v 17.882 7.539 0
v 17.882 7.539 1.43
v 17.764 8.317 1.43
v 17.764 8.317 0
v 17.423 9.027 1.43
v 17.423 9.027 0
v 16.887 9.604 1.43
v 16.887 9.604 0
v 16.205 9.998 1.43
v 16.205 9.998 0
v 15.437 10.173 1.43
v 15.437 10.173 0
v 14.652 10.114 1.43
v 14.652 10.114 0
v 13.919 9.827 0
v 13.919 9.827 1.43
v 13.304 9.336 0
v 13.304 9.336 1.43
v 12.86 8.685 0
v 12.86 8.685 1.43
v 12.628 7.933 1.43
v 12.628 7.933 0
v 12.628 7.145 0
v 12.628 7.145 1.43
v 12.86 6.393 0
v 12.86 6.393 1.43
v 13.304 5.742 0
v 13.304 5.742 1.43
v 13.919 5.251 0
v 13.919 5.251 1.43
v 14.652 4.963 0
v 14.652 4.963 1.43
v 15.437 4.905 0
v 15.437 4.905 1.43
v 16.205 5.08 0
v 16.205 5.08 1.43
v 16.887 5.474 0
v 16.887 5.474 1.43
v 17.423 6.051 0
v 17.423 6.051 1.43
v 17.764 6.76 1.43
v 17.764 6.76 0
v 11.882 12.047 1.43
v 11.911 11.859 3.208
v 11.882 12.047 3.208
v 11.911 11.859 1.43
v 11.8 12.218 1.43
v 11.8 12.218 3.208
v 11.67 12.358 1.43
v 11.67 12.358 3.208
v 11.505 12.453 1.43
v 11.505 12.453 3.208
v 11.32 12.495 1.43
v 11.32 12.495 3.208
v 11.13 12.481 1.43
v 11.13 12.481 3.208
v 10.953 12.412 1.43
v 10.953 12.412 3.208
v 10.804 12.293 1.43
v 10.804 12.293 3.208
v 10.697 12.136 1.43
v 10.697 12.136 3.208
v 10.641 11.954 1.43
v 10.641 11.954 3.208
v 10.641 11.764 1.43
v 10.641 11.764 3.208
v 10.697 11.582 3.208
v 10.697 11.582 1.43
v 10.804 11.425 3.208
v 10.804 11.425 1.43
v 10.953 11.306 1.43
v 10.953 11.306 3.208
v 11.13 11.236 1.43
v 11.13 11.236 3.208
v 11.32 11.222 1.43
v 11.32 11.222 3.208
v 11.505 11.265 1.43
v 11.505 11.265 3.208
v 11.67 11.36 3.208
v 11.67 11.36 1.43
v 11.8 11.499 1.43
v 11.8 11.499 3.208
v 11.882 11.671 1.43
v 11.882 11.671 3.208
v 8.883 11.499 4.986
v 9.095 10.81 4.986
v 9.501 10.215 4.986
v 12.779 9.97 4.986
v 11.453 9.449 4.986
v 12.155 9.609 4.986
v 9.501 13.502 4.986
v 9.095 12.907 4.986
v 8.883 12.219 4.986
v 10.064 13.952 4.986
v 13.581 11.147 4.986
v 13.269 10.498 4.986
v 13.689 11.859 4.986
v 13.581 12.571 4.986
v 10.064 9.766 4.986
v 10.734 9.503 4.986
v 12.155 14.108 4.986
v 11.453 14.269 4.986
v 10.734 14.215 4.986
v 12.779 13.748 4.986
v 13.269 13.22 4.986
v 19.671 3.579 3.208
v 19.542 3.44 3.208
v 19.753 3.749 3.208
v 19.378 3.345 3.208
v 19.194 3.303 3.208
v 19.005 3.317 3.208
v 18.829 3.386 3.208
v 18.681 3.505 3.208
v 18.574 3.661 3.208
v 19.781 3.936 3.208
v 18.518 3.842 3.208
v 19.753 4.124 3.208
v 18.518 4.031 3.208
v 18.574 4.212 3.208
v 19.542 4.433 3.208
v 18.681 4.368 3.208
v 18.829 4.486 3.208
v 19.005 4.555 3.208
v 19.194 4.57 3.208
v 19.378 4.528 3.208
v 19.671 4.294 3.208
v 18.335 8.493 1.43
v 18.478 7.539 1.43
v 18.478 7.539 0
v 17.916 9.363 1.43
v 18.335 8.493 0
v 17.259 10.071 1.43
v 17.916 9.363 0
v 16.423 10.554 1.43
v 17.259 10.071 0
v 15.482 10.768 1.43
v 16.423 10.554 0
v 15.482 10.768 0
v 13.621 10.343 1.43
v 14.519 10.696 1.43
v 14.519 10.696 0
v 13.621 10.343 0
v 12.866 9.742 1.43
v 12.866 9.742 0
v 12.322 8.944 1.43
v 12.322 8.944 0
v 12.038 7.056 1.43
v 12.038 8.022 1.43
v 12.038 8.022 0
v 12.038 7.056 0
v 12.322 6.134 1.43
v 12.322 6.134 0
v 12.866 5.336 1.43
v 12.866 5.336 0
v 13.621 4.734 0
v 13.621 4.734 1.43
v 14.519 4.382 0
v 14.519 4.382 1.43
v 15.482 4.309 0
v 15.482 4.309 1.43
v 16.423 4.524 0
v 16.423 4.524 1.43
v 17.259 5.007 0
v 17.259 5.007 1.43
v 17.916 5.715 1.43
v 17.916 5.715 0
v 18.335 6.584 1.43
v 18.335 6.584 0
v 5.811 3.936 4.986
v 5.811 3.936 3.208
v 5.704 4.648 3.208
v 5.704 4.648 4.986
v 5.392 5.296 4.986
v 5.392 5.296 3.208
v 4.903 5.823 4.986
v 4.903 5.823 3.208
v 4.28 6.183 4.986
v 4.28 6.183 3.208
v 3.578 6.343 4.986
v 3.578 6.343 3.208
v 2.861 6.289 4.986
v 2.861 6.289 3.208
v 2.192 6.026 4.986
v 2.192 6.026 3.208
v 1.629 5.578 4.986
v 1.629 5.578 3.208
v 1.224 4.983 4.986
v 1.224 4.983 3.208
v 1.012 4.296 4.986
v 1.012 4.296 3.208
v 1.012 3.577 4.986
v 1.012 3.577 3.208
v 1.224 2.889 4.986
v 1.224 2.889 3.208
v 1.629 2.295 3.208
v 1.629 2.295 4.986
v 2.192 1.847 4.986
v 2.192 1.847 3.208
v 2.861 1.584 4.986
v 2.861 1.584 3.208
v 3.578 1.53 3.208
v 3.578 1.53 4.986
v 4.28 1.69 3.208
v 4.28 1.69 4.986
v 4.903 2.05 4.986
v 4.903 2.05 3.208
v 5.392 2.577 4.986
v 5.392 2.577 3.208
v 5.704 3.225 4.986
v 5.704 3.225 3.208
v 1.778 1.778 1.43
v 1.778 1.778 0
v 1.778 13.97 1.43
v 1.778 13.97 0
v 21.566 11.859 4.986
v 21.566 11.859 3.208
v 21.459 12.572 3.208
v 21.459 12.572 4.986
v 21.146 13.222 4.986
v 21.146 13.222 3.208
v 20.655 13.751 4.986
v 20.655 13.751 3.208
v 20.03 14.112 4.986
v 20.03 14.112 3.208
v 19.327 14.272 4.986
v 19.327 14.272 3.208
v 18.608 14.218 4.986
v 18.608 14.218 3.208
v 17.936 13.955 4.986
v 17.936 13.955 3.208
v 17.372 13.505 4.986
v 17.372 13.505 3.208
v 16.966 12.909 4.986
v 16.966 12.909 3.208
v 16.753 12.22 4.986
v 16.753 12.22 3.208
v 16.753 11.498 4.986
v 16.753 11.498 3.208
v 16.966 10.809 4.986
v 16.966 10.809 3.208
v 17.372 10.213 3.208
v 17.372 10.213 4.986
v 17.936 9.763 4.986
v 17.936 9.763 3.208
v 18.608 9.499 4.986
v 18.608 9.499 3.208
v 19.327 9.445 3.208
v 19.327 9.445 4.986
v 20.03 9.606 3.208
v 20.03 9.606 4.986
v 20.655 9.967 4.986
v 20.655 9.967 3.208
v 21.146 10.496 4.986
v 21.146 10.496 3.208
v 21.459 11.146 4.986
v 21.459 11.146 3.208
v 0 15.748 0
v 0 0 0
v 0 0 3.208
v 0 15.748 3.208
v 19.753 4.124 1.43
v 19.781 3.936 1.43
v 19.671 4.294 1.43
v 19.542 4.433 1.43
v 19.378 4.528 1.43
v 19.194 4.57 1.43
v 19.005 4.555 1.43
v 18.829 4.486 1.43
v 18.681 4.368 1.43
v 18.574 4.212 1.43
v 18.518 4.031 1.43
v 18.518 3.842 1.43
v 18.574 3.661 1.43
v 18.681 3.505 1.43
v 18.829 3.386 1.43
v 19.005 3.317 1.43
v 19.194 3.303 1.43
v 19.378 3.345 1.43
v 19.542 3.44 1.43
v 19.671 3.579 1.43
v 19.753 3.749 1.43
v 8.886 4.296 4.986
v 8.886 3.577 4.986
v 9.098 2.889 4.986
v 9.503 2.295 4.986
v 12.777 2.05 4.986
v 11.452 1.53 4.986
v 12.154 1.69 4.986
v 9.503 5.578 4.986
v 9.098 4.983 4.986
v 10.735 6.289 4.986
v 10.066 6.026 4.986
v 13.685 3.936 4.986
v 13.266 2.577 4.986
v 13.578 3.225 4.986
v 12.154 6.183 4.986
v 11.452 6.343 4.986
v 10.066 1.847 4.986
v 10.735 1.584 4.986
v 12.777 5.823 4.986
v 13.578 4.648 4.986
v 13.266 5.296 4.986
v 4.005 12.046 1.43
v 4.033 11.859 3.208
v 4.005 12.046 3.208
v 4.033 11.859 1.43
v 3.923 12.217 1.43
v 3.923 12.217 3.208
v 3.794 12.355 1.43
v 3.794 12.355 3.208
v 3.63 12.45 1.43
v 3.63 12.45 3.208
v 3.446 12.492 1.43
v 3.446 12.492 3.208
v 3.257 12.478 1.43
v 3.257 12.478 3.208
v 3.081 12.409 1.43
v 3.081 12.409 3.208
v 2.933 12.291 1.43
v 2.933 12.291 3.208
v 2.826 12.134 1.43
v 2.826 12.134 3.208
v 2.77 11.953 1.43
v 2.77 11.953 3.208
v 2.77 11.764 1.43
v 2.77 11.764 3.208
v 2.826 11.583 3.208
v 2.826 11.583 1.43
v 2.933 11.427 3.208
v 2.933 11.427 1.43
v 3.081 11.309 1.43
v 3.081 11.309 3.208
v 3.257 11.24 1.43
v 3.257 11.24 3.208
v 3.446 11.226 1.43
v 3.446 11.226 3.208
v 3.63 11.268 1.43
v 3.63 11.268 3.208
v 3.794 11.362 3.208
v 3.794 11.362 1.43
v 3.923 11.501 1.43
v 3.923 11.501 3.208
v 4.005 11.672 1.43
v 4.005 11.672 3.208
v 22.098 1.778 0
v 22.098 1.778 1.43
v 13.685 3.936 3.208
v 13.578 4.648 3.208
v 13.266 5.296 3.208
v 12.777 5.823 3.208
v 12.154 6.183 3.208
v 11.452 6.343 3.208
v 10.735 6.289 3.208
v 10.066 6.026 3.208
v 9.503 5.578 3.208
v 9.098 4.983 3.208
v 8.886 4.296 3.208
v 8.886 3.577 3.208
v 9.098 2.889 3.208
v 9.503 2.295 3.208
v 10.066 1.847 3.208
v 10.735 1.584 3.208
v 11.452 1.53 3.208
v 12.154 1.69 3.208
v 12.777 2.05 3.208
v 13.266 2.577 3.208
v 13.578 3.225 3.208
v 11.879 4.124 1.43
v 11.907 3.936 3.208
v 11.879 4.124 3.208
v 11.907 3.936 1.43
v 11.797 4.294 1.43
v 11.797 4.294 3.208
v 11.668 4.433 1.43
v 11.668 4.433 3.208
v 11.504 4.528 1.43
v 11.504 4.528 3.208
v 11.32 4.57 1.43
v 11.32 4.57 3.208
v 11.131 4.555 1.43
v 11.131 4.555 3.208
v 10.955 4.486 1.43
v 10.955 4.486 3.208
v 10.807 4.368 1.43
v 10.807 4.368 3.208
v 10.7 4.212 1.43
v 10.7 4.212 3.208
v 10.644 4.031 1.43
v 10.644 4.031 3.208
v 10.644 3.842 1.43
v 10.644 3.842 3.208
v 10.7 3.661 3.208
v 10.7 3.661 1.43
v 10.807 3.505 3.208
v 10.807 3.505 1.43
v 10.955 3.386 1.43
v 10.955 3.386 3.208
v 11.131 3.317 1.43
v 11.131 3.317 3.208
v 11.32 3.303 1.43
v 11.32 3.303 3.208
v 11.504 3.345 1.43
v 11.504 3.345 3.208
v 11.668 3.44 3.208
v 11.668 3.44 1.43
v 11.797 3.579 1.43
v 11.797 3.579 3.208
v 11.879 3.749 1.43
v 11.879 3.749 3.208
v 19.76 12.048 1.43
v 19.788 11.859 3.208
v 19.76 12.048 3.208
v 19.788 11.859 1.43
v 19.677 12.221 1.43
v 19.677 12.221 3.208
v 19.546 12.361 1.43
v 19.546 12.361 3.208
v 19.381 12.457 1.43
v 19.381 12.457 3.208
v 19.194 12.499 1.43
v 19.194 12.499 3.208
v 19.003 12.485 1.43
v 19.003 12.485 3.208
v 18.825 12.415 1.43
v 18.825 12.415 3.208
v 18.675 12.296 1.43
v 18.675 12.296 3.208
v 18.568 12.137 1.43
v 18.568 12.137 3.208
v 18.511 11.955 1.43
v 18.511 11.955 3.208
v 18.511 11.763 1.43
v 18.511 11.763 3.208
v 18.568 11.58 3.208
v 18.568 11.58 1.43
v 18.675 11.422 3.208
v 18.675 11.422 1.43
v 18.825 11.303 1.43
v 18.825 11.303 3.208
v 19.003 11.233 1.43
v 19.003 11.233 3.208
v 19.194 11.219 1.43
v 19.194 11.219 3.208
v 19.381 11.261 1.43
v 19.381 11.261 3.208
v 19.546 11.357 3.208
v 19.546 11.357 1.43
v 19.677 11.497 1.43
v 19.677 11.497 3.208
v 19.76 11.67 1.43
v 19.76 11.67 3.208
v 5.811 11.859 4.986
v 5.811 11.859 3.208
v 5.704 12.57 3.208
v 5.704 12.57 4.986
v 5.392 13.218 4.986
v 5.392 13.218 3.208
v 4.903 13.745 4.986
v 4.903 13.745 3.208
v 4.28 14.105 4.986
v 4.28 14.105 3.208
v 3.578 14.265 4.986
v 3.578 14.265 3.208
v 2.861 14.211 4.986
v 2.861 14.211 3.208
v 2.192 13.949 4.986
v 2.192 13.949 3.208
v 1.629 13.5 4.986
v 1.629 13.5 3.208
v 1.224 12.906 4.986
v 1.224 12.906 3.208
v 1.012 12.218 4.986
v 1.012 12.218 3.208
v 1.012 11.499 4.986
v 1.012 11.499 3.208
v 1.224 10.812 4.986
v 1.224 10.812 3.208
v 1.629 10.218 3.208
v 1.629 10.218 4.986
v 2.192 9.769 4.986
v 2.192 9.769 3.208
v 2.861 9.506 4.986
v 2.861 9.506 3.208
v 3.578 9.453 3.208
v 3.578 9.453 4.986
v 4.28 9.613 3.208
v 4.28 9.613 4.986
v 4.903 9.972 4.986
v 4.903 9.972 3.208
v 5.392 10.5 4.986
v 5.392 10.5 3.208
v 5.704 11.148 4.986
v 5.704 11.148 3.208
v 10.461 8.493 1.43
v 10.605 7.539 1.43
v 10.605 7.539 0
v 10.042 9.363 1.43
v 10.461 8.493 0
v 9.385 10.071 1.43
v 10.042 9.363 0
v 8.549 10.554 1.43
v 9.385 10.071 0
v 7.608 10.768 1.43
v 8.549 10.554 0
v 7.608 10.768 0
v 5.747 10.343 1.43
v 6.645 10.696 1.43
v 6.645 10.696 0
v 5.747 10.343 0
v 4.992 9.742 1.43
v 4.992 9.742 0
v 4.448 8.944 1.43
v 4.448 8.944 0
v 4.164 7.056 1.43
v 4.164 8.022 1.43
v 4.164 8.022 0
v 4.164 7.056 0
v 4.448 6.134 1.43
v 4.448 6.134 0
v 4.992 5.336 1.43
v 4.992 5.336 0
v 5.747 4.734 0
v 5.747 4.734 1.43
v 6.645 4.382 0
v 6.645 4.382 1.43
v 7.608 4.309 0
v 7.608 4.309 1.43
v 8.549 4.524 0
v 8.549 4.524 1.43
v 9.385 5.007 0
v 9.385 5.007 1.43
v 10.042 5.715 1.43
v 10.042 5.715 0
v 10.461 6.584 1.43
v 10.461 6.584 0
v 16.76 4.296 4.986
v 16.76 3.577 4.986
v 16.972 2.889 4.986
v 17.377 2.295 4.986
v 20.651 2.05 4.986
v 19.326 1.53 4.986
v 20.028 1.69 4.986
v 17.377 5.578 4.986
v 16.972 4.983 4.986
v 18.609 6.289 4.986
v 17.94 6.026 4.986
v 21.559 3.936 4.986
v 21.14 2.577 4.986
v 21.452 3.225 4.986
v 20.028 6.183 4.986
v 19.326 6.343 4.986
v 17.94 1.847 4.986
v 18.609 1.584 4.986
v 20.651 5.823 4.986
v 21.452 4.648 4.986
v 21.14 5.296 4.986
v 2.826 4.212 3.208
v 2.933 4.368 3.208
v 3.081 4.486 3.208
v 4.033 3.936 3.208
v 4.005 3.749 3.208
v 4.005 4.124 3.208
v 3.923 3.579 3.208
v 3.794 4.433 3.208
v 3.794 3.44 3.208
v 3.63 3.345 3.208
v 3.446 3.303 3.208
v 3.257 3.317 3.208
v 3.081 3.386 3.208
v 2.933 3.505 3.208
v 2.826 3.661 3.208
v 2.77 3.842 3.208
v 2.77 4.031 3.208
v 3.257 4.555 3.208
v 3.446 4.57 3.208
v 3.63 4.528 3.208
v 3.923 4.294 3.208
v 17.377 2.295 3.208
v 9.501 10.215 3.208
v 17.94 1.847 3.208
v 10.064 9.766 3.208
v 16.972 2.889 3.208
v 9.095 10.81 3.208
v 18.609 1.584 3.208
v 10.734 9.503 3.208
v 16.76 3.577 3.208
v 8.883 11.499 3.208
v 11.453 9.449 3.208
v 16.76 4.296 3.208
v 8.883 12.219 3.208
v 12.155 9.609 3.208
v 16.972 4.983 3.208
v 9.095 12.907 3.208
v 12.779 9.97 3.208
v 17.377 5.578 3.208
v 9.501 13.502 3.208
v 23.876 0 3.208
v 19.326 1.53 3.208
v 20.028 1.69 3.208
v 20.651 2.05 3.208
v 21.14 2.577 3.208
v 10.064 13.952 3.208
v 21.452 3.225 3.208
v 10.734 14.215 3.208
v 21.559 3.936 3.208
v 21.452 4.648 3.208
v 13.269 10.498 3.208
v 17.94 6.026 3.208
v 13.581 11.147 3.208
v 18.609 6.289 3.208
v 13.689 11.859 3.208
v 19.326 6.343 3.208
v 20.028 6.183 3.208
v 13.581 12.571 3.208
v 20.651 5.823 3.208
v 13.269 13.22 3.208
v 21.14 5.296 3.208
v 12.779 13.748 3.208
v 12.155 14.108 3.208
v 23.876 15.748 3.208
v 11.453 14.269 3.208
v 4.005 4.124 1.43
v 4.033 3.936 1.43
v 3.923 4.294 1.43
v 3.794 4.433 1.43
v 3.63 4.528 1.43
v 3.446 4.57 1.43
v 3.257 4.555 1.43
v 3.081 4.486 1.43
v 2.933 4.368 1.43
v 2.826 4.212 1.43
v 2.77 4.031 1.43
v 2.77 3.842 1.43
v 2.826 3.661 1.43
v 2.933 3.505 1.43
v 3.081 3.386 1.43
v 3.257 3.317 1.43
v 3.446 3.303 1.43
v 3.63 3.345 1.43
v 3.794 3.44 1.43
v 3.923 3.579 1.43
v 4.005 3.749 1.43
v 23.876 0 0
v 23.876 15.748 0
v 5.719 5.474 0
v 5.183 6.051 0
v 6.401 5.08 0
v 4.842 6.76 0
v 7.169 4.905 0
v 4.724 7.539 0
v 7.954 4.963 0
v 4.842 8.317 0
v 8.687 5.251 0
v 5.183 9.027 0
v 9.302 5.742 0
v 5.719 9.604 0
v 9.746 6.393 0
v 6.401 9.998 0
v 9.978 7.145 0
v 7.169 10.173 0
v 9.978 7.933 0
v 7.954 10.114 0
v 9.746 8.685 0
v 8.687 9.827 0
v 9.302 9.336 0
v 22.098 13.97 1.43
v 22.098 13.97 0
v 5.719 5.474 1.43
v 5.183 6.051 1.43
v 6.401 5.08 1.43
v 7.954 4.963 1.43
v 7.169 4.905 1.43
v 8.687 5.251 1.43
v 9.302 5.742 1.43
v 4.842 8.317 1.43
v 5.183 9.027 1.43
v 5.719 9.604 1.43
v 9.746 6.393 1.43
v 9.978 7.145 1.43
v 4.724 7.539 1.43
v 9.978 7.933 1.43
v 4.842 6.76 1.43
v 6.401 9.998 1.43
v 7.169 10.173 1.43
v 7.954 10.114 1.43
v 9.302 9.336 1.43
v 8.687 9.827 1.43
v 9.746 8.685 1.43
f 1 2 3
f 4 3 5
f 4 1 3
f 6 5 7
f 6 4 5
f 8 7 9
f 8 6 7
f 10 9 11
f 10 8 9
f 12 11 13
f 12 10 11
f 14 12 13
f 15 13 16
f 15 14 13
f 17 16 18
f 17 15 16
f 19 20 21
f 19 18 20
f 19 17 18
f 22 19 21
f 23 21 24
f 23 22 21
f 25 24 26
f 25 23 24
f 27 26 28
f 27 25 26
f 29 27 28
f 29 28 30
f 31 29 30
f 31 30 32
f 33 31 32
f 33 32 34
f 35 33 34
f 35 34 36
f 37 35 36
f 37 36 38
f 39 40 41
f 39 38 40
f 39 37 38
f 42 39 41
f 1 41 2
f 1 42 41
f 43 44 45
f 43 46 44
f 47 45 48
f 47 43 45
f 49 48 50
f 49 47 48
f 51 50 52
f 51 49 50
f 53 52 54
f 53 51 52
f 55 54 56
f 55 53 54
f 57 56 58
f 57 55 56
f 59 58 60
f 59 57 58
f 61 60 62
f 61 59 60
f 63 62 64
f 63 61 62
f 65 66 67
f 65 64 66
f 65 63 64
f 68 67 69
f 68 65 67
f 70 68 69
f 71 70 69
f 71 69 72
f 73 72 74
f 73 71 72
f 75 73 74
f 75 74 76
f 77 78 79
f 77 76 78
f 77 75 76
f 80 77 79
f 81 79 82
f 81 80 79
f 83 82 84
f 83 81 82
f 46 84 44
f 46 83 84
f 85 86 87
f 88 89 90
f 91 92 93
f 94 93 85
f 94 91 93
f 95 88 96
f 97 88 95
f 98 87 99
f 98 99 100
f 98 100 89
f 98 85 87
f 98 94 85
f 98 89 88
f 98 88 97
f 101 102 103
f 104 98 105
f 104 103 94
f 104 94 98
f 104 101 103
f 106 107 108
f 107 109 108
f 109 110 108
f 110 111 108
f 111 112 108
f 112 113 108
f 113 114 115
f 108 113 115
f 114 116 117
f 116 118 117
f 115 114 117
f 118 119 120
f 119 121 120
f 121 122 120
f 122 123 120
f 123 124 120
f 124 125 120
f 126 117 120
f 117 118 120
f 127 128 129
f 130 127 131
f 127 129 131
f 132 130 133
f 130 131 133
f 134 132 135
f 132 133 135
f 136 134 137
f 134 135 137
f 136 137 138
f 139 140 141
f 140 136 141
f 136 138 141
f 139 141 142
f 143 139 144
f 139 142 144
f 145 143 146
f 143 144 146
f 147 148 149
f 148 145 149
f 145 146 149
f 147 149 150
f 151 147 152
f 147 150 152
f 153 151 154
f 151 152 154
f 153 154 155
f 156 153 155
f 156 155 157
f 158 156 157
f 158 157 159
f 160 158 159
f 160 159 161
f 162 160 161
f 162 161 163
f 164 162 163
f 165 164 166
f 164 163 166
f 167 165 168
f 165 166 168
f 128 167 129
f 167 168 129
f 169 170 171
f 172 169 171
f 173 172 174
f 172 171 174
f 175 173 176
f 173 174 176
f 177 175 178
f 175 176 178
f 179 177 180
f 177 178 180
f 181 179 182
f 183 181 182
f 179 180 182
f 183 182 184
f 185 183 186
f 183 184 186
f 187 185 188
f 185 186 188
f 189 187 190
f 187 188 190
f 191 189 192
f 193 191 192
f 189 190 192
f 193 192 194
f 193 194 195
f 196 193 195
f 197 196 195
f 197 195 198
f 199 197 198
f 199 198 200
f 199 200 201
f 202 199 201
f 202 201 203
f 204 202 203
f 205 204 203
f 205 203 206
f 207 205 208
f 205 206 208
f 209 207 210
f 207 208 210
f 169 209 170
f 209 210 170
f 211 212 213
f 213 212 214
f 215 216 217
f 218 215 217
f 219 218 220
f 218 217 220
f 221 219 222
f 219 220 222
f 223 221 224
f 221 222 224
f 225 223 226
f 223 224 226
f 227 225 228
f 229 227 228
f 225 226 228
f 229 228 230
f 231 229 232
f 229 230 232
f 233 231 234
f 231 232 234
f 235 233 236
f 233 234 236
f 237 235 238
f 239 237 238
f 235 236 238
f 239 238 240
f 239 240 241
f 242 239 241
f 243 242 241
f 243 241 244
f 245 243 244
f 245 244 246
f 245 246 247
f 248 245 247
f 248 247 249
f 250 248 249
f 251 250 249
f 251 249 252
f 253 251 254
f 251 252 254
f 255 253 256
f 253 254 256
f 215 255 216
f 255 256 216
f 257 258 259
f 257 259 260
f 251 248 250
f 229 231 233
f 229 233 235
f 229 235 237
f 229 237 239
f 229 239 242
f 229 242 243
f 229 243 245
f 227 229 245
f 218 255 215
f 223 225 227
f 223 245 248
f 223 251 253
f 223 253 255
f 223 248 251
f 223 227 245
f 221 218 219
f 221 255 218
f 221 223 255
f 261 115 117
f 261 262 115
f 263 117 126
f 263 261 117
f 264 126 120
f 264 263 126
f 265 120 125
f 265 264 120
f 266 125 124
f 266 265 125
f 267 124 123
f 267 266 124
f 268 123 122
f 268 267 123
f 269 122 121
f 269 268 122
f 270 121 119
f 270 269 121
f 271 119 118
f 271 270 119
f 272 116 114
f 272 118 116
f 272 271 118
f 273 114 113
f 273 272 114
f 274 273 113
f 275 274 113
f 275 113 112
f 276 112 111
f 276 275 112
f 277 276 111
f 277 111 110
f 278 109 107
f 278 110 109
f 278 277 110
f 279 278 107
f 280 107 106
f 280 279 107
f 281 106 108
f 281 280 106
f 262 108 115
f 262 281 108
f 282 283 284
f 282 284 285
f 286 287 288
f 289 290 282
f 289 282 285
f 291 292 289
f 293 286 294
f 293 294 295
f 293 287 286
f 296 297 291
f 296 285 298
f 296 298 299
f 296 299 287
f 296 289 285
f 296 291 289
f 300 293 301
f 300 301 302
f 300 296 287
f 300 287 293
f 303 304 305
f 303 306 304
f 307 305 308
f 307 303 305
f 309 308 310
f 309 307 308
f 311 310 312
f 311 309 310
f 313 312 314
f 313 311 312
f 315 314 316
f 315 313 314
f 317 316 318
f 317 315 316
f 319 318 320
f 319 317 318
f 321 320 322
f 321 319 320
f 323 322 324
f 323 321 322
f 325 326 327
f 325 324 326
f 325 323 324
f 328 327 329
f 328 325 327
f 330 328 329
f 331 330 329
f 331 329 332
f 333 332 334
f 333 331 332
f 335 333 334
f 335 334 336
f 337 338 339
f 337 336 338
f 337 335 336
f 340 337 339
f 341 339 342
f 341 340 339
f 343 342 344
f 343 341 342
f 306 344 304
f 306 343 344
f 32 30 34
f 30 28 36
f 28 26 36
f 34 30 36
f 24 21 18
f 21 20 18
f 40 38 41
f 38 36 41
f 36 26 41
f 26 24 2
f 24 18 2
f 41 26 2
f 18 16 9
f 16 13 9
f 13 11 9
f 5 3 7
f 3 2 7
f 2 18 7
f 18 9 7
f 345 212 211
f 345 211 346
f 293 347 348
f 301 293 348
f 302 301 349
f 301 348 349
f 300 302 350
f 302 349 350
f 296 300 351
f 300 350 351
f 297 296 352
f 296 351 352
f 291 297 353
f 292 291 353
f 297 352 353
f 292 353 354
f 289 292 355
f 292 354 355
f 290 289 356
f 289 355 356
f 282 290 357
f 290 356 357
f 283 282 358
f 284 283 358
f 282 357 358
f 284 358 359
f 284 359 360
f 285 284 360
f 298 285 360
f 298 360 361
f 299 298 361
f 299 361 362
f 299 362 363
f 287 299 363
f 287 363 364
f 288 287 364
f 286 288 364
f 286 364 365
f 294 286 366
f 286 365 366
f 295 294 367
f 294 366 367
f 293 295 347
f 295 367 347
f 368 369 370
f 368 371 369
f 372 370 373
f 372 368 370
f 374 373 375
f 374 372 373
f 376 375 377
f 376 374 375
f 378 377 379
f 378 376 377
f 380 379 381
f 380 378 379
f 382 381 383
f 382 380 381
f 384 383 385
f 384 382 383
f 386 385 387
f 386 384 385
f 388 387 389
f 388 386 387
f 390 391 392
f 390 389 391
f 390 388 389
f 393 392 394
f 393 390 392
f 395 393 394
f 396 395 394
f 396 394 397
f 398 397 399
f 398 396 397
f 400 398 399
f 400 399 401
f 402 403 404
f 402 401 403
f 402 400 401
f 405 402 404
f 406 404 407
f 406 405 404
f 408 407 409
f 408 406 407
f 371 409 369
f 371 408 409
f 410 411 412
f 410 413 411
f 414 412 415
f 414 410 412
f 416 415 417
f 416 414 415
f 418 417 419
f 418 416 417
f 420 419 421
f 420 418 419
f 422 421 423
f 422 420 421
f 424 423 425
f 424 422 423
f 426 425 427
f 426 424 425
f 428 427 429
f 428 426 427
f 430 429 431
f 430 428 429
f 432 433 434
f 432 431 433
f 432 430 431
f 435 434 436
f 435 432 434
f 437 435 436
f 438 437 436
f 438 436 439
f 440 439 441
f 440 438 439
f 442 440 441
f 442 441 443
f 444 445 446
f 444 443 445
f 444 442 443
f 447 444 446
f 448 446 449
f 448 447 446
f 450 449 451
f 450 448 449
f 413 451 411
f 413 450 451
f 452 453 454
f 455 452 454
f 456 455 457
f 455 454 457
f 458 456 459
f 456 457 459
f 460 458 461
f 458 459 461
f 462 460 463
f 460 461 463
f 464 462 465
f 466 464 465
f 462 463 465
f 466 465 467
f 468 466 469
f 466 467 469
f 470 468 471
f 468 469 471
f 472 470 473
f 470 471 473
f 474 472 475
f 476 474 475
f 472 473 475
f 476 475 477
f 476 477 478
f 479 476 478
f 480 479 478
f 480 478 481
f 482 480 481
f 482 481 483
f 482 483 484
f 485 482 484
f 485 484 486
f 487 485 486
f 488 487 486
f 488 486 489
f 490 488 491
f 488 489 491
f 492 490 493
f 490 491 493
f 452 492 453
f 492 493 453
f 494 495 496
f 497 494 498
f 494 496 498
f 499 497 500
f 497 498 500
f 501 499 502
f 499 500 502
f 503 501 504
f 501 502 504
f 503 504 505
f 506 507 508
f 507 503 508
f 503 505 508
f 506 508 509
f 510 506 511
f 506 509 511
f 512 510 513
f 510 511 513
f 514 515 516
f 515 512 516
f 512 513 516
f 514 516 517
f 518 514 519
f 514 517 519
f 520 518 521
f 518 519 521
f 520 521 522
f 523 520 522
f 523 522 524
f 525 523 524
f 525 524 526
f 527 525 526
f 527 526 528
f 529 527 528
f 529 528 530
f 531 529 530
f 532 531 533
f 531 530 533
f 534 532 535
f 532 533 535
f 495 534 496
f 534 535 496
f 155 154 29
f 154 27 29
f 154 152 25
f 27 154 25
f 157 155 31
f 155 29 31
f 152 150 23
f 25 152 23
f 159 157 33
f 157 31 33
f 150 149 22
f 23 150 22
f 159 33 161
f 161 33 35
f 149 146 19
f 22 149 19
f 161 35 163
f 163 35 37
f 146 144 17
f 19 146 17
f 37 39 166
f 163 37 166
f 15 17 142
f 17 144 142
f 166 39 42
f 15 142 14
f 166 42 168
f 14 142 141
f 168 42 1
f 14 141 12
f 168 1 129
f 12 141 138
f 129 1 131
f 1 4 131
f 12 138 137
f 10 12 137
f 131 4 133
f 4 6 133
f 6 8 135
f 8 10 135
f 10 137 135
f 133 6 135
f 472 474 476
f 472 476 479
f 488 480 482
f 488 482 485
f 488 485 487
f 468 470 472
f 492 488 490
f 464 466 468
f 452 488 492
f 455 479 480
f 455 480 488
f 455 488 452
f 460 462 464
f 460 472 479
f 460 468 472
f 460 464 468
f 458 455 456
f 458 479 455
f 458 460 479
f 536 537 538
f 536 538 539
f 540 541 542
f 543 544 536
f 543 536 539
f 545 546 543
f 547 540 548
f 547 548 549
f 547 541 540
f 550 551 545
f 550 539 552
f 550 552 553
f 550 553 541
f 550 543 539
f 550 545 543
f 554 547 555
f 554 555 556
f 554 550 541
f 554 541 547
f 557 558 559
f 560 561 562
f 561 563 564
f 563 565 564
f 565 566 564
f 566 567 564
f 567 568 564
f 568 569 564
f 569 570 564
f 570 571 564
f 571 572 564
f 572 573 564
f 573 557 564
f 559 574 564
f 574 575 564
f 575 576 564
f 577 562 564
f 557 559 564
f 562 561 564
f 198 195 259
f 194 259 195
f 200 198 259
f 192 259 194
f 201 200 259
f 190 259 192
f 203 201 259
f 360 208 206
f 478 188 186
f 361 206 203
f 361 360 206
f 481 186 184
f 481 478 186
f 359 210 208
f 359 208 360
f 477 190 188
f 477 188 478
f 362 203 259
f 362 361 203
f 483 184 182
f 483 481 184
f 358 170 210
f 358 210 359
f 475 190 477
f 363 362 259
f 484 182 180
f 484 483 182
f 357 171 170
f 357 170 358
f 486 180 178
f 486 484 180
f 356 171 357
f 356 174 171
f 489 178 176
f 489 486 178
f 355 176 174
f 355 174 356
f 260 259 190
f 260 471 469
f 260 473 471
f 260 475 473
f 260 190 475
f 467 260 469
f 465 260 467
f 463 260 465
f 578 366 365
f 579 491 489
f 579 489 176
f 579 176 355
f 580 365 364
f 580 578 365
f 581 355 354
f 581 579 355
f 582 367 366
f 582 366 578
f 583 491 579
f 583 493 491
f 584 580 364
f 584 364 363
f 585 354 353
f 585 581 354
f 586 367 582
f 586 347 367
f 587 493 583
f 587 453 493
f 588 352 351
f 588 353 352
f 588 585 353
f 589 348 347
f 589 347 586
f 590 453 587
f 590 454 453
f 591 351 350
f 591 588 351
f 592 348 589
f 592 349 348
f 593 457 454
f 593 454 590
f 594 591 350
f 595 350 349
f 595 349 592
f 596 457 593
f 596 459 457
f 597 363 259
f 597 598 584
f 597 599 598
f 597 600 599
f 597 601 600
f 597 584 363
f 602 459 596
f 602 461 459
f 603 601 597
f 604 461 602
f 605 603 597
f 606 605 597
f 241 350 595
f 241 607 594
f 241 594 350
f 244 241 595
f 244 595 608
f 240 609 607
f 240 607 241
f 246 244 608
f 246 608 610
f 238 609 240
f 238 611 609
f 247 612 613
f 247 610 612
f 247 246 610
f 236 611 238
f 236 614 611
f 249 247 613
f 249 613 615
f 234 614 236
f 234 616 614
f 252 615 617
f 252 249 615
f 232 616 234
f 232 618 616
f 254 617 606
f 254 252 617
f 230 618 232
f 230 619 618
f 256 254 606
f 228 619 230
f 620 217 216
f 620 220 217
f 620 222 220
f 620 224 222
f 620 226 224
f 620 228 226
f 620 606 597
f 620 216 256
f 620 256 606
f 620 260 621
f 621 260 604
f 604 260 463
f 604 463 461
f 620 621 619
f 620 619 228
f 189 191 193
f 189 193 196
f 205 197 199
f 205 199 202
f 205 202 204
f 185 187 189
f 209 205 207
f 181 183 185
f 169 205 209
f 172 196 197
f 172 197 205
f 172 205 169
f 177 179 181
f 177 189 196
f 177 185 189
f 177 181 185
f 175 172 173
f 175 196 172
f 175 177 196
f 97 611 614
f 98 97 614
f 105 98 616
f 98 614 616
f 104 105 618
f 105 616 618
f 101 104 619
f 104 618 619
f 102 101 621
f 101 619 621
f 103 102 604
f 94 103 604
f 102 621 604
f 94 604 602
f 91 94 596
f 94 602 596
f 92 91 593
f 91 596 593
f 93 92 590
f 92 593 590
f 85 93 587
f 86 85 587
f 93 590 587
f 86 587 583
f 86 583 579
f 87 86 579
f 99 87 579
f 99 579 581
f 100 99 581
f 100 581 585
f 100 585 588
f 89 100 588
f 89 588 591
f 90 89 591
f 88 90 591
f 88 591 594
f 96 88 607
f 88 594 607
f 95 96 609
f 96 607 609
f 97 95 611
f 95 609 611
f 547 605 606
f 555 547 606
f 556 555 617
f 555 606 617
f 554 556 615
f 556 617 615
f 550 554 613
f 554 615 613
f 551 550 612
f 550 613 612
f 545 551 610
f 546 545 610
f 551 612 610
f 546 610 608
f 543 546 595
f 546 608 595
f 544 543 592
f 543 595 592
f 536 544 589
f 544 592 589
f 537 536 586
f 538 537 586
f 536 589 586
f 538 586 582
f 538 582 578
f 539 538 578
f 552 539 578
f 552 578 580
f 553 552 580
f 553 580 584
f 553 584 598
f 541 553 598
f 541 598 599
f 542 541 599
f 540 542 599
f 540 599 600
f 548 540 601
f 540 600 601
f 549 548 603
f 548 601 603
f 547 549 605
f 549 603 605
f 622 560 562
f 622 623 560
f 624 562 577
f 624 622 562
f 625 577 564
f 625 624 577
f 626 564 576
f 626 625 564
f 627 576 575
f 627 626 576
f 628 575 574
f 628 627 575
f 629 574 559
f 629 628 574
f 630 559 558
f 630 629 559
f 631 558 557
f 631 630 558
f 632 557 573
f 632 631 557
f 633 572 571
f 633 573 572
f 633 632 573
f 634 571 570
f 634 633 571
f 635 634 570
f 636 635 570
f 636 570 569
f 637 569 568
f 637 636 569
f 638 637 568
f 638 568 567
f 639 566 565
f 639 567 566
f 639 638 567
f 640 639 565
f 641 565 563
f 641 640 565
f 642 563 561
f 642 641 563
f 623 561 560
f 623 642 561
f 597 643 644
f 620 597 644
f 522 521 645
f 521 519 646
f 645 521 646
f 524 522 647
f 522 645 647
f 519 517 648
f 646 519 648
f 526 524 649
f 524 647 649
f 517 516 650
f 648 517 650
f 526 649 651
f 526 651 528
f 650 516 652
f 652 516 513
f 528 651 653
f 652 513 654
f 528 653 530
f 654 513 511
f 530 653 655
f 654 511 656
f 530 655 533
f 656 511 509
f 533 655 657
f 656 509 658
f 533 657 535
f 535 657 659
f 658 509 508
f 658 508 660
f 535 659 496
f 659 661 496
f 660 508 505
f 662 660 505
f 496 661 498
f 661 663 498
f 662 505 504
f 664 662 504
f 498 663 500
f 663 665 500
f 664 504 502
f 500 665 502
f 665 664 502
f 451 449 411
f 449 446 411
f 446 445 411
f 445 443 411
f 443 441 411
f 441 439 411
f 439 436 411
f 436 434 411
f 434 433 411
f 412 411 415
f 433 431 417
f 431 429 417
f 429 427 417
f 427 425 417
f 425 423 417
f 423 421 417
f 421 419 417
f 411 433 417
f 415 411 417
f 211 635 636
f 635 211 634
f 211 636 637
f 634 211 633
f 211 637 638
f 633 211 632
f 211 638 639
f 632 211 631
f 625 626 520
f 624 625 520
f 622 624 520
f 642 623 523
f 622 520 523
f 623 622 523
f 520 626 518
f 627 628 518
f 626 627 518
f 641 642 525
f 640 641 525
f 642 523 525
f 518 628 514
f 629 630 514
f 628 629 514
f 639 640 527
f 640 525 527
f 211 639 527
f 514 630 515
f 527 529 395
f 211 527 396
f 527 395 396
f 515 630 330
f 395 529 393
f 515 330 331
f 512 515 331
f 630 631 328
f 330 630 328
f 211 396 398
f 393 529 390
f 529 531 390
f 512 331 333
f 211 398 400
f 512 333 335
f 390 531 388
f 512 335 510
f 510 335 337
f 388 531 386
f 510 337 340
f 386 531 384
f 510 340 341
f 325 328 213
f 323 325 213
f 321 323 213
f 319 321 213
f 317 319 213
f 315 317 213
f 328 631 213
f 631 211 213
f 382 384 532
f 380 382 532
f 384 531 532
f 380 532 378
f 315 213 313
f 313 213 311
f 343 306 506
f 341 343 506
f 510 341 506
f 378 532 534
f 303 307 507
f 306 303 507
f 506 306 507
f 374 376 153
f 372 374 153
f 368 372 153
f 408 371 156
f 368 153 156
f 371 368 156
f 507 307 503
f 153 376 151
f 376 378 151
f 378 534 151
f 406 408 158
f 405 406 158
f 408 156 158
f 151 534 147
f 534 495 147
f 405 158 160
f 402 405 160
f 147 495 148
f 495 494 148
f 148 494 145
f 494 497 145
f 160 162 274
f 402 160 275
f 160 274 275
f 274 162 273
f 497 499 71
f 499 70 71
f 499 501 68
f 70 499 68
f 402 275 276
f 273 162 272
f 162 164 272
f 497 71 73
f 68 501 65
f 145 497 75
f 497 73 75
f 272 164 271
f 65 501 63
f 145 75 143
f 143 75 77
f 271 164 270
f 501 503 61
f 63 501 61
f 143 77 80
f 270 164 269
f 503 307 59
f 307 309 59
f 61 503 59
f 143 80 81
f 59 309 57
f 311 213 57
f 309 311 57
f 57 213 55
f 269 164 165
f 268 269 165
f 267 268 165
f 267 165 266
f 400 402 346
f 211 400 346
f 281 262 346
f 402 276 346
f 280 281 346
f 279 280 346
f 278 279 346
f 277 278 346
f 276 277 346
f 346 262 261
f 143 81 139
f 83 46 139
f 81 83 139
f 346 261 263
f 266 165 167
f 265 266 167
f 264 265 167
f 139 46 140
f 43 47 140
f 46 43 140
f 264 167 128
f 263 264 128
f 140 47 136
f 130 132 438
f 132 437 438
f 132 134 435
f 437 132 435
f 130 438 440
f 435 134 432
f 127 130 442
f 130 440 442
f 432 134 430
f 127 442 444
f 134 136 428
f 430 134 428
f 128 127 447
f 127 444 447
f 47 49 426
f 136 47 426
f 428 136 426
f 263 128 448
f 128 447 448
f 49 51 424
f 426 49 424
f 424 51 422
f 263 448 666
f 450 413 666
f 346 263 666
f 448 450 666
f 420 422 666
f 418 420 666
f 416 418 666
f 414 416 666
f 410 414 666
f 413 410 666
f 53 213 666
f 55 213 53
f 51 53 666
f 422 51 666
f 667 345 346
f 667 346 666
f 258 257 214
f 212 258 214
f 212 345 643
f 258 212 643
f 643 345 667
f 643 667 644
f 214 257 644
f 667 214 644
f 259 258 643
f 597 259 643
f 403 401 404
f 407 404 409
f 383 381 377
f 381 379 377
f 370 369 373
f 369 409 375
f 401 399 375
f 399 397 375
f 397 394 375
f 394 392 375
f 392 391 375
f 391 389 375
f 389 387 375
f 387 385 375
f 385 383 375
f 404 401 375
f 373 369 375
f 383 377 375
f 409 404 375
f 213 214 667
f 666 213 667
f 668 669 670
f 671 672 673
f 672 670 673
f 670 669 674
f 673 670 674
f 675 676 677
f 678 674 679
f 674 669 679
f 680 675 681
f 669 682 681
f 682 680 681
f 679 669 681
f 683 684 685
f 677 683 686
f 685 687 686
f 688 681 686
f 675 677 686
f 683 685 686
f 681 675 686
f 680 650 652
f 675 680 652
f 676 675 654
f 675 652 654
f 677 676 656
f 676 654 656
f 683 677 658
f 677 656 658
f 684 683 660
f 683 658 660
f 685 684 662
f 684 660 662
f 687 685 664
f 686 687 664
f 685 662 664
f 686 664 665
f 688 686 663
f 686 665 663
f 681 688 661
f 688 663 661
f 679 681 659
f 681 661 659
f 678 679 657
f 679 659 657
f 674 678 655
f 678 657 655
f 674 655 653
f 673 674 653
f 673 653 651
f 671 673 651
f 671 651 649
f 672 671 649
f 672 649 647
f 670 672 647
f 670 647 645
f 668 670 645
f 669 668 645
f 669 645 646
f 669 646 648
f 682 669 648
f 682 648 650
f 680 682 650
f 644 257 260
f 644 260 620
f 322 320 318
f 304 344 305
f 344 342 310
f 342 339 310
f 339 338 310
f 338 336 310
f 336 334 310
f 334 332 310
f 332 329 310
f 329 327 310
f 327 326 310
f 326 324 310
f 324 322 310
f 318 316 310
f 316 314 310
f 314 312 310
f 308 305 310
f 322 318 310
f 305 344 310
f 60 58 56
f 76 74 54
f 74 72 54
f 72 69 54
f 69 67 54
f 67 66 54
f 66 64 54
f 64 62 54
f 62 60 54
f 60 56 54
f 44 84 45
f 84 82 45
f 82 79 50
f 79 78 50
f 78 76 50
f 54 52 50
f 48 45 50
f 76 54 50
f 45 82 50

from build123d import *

# Parameters (mm, degrees)
F0_W      = 23.876
F0_H      = 15.748
F1_DEPTH  = 3.20802
F2_R      = 2.413
F3_DEPTH  = 1.778
F2_R_2    = 2.4164208991
F4_DEPTH  = 1.778
F2_R_3    = 2.4201182345
F5_DEPTH  = 1.778
F6_DEPTH  = 1.778
F7_DEPTH  = 1.778
F8_DEPTH  = 1.778
F9_T      = -1.778
F10_R     = 3.2385
F10_R_2   = 2.6416
F11_DEPTH = 3.06898


# Not quite as in the source:
# - a feature names something its author has since deleted; it is built from what else it names


with BuildPart() as f1:
    # F0 (on Top) → F1 (new body)
    with BuildSketch(Plane.XY):
        with Locations((11.938, 7.874)):
            Rectangle(F0_W, F0_H)
    extrude(amount=F1_DEPTH)

    # F2 (on face) → F3 (join)
    with BuildSketch(Plane.XY.offset(3.20802)):
        with Locations((3.3980837251, 11.858843371)):
            Circle(F2_R)
    extrude(amount=F3_DEPTH)

    # F2 (on face) → F4 (join)
    with BuildSketch(Plane.XY.offset(3.20802)):
        with Locations((11.2720837251, 11.858843371)):
            Circle(F2_R_2)
    extrude(amount=F4_DEPTH)

    # F2 (on face) → F5 (join)
    with BuildSketch(Plane.XY.offset(3.20802)):
        with Locations((19.1460837251, 11.858843371)):
            Circle(F2_R_3)
    extrude(amount=F5_DEPTH)

    # F2 (on face) → F6 (join)
    with BuildSketch(Plane.XY.offset(3.20802)):
        with Locations((3.3980837251, 3.9364123053)):
            Circle(F2_R)
    extrude(amount=F6_DEPTH)

    # F2 (on face) → F7 (join)
    with BuildSketch(Plane.XY.offset(3.20802)):
        with Locations((11.2720837251, 3.9364123053)):
            Circle(F2_R)
    extrude(amount=F7_DEPTH)

    # F2 (on face) → F8 (join)
    with BuildSketch(Plane.XY.offset(3.20802)):
        with Locations((19.1460837251, 3.9364123053)):
            Circle(F2_R)
    extrude(amount=F8_DEPTH)

    # F9
    f9_openings = [f1.faces().sort_by_distance(p)[0] for p in [
        (11.938, 7.874, 0),
    ]]
    offset(amount=F9_T, openings=f9_openings, kind=Kind.INTERSECTION)

    # F10 (on face) → F11 (join)
    with BuildSketch(Plane.XY):
        with BuildLine():
            ThreePointArc((4.1275, 7.5388690457), (7.366, 4.3003690457), (10.6045, 7.5388690457))
            ThreePointArc((10.6045, 7.5388690457), (7.366, 10.7773690457), (4.1275, 7.5388690457))
        make_face()
        with BuildLine():
            ThreePointArc((10.0076, 7.5388690457), (7.366, 4.8972690457), (4.7244, 7.5388690457))
            ThreePointArc((4.7244, 7.5388690457), (7.366, 10.1804690457), (10.0076, 7.5388690457))
        make_face(mode=Mode.SUBTRACT)
        with Locations((15.24, 7.5388690457)):
            Circle(F10_R)
        with Locations((15.24, 7.5388690457)):
            Circle(F10_R_2, mode=Mode.SUBTRACT)
    extrude(amount=F11_DEPTH)


solid = f1.part
